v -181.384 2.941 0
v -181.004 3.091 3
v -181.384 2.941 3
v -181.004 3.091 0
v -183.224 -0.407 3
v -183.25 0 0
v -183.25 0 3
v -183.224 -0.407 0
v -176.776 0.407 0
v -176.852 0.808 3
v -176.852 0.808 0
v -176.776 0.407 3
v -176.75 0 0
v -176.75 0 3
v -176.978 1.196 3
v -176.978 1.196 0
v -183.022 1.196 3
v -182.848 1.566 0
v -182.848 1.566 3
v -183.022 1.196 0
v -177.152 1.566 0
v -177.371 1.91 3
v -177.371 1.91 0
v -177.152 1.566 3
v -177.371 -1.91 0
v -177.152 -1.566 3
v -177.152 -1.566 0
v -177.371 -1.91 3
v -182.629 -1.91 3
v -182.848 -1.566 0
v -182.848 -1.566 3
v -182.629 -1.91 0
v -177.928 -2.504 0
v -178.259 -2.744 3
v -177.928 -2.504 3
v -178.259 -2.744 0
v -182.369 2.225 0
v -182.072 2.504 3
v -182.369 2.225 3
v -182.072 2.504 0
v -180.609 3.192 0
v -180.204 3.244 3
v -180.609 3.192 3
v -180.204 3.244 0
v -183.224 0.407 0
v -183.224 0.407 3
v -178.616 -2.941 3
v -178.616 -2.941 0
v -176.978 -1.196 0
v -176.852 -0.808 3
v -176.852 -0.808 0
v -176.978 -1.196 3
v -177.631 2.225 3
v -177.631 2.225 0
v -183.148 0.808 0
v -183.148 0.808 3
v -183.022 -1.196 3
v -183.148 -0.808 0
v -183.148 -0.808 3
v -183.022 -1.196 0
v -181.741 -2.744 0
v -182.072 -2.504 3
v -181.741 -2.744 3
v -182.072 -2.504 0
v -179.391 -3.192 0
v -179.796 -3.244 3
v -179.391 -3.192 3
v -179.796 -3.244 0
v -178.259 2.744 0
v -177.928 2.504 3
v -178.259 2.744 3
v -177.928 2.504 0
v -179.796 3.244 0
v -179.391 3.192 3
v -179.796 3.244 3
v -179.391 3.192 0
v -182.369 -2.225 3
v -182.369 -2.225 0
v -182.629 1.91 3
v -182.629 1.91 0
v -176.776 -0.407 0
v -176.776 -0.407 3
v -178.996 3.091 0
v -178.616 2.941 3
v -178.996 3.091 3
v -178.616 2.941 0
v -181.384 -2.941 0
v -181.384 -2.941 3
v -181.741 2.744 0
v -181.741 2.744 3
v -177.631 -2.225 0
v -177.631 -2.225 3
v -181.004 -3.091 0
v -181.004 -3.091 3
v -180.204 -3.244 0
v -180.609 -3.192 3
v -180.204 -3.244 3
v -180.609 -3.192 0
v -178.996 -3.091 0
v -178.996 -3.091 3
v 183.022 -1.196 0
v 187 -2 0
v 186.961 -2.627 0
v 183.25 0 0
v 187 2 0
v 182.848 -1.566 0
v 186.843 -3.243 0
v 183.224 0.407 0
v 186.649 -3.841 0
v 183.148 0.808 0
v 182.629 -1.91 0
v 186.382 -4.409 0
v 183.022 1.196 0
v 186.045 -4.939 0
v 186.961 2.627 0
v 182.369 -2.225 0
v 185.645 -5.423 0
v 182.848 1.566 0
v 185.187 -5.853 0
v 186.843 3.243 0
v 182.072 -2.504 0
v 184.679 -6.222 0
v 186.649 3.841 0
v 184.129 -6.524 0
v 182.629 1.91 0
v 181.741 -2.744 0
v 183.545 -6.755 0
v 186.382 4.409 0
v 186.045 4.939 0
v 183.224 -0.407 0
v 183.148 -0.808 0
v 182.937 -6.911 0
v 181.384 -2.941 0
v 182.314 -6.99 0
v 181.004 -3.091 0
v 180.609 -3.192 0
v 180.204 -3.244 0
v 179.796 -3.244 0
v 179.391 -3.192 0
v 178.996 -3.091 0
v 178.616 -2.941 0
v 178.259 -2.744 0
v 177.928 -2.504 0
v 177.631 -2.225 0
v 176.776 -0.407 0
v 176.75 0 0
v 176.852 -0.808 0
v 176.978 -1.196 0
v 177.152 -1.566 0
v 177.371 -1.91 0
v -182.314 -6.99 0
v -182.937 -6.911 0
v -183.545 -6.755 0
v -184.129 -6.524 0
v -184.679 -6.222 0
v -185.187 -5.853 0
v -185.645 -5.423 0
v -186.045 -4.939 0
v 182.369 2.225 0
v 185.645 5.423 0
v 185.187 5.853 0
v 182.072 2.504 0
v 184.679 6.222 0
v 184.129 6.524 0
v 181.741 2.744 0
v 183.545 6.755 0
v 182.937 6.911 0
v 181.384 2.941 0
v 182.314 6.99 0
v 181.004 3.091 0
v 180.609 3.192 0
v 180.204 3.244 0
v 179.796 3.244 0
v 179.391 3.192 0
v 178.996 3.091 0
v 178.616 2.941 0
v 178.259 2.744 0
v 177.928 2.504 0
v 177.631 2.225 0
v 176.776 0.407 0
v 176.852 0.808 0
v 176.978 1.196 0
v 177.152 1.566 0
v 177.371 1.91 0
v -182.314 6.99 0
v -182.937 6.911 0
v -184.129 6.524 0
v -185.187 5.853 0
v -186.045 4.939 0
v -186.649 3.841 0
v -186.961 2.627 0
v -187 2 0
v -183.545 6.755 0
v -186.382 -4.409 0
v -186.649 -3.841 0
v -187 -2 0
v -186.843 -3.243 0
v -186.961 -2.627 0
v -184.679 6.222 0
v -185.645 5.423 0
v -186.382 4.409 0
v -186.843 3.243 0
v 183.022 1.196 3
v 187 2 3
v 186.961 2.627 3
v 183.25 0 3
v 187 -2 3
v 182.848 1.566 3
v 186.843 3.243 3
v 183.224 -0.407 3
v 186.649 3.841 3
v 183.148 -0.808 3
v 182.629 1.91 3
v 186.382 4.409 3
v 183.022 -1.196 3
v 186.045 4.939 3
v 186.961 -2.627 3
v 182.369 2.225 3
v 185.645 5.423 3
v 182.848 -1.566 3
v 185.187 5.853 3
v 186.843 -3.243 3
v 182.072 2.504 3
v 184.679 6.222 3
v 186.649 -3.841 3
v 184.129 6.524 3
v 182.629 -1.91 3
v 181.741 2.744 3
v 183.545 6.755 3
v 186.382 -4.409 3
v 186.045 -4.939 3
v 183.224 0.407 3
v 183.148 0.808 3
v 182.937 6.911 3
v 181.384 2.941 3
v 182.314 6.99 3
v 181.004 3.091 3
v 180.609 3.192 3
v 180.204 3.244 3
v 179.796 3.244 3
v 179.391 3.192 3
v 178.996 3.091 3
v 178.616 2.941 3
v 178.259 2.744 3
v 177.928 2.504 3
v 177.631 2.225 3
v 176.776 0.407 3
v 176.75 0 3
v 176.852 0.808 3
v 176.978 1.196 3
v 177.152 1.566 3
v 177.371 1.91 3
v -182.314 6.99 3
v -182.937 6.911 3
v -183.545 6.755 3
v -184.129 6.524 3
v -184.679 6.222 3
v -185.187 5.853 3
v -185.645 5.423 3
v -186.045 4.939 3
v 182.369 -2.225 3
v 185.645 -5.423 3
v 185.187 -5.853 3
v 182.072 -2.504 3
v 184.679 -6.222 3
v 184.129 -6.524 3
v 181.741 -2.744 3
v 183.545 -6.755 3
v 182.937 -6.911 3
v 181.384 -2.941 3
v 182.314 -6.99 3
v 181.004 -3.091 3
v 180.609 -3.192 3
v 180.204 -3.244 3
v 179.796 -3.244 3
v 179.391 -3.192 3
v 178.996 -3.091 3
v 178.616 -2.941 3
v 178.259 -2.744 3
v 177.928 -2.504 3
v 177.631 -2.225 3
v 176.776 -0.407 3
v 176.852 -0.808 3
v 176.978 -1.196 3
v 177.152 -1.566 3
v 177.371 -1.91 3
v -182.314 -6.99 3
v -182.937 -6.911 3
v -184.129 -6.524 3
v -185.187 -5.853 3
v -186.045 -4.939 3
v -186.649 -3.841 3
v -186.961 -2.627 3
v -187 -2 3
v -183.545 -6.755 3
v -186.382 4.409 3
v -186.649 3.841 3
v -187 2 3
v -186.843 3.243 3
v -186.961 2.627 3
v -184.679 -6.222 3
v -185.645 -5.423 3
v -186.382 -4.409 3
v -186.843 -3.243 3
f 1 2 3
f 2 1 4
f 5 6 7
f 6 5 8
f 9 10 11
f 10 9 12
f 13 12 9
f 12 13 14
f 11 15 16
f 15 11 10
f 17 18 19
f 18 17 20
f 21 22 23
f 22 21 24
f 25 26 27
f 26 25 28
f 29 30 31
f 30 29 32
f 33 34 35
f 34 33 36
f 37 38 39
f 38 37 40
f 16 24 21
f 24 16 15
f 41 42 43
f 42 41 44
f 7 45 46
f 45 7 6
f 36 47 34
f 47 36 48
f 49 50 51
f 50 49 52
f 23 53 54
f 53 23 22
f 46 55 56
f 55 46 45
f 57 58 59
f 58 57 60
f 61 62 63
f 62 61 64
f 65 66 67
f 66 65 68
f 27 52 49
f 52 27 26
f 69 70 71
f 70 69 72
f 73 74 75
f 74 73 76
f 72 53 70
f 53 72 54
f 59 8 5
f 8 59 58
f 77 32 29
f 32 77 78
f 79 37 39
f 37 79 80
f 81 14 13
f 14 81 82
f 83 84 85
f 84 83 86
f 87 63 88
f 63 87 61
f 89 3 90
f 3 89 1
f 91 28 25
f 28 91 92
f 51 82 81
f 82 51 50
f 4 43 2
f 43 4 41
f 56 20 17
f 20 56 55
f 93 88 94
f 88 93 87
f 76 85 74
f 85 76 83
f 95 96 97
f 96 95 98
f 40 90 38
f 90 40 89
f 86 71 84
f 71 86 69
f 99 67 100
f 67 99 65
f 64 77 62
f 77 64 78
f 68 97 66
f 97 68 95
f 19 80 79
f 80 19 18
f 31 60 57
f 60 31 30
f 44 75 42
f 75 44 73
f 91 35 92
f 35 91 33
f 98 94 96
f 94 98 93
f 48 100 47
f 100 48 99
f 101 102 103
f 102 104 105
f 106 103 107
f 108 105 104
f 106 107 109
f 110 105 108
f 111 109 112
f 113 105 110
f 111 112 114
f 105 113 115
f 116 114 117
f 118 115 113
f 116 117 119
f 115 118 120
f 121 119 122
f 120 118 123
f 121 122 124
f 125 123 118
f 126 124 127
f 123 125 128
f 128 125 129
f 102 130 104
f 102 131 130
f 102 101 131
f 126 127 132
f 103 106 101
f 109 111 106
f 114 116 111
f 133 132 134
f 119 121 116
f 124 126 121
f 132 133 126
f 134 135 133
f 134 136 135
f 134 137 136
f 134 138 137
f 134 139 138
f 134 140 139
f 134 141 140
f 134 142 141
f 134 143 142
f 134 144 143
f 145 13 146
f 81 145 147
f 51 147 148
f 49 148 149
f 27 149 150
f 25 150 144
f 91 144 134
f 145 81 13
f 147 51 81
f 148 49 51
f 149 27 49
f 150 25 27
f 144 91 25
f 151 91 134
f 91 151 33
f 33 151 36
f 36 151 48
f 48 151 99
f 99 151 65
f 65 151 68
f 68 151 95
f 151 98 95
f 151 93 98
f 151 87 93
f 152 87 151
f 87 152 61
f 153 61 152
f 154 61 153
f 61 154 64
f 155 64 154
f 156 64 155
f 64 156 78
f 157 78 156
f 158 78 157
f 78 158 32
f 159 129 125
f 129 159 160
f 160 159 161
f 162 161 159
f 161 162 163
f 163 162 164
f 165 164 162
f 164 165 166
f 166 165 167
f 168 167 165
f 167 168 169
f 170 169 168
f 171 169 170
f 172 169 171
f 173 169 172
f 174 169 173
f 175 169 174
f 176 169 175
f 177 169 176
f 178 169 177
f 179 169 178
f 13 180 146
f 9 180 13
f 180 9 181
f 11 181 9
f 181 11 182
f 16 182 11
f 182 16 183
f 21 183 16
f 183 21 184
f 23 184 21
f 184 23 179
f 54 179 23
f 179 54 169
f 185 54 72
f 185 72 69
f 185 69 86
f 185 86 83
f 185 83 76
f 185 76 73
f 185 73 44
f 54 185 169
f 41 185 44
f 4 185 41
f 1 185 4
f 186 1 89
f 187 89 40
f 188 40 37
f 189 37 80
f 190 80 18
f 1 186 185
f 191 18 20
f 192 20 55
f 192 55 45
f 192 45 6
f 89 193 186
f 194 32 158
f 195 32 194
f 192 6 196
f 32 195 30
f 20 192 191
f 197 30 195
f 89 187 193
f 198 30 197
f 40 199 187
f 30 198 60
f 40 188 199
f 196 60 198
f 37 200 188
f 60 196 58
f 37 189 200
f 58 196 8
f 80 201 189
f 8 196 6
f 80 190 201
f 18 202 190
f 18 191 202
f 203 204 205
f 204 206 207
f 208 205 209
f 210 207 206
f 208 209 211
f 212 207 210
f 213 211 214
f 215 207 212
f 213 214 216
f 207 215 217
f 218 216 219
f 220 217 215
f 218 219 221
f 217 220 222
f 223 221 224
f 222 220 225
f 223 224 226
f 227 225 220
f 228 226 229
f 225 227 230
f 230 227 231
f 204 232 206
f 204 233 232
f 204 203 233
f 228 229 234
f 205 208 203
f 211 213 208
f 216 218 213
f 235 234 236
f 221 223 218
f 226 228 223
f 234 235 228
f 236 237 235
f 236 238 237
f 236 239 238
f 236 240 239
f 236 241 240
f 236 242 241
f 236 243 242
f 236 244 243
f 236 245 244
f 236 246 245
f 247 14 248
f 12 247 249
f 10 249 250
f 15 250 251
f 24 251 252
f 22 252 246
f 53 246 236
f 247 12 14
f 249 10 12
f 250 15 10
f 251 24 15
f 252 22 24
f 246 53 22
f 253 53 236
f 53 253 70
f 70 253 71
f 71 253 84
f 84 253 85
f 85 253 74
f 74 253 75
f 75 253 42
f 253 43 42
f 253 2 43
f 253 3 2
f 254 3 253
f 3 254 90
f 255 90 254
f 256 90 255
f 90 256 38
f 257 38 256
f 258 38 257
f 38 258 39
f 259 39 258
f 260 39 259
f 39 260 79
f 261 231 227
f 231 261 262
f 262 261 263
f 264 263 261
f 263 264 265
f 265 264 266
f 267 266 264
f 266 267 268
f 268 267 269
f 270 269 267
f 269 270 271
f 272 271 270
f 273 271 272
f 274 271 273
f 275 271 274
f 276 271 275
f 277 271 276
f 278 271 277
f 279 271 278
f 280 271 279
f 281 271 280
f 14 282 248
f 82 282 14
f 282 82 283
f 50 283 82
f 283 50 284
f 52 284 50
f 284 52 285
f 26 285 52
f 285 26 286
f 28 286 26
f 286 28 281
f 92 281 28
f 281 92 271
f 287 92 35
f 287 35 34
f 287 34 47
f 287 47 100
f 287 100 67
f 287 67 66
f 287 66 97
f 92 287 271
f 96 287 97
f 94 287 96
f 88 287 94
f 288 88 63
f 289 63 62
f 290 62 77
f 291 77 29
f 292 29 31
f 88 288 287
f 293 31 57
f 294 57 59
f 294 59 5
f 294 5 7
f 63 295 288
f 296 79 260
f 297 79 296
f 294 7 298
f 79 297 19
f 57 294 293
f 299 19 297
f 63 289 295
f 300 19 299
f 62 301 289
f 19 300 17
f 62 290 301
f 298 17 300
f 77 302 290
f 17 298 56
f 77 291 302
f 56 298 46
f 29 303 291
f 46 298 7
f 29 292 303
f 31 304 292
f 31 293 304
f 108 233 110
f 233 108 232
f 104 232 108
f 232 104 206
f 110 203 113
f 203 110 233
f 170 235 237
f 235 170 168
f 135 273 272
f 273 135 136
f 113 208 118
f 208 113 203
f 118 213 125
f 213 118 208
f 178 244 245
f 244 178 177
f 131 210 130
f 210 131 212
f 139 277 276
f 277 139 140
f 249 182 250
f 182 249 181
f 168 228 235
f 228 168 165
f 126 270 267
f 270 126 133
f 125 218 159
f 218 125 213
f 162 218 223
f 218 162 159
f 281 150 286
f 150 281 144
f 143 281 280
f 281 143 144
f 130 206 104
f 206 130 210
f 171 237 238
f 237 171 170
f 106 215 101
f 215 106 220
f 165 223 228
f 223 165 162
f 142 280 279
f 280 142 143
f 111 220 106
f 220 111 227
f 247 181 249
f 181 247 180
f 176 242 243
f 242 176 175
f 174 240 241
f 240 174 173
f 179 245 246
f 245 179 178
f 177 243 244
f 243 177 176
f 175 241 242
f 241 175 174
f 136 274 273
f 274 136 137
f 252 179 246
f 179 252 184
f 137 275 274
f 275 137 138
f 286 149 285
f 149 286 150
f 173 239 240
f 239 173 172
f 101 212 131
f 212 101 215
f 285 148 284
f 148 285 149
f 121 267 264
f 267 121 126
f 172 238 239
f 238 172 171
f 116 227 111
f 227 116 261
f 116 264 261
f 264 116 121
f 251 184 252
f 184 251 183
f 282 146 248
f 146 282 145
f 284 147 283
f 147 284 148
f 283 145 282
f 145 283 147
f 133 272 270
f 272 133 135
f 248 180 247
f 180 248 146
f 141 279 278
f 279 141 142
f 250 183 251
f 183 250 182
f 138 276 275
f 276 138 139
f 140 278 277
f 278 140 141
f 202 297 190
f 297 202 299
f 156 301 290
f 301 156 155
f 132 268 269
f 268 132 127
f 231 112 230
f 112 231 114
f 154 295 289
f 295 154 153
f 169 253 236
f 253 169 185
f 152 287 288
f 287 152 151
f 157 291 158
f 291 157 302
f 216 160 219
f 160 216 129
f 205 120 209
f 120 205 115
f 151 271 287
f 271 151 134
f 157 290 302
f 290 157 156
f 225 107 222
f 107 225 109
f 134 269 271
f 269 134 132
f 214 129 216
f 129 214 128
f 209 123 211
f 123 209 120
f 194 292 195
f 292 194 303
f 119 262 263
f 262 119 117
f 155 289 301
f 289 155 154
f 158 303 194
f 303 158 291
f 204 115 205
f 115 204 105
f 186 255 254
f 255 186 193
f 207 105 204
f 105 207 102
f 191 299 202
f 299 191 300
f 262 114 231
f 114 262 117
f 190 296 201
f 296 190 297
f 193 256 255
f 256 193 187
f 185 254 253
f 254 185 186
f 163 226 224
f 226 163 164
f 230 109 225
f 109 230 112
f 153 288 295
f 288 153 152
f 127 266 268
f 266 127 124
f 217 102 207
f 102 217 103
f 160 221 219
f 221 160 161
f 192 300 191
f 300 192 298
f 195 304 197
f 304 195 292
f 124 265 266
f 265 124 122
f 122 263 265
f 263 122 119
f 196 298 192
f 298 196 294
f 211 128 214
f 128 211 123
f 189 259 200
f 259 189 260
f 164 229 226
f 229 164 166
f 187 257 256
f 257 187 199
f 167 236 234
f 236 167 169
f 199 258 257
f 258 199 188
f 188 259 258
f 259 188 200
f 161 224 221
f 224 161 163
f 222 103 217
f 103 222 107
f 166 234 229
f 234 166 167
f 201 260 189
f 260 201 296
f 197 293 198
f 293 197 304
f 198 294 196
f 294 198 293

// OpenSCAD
$fn = 50;


difference() {
	union() {
		hull() {
			translate(v = [-182.0000000000, 2.0000000000, 0]) {
				cylinder(h = 3, r = 5);
			}
			translate(v = [182.0000000000, 2.0000000000, 0]) {
				cylinder(h = 3, r = 5);
			}
			translate(v = [-182.0000000000, -2.0000000000, 0]) {
				cylinder(h = 3, r = 5);
			}
			translate(v = [182.0000000000, -2.0000000000, 0]) {
				cylinder(h = 3, r = 5);
			}
		}
	}
	union() {
		translate(v = [-180.0000000000, 0.0000000000, 0]) {
			cylinder(h = 3, r = 3.2500000000);
		}
		translate(v = [180.0000000000, 0.0000000000, 0]) {
			cylinder(h = 3, r = 3.2500000000);
		}
		translate(v = [-180.0000000000, 0.0000000000, 0]) {
			cylinder(h = 3, r = 1.8000000000);
		}
		translate(v = [180.0000000000, 0.0000000000, 0]) {
			cylinder(h = 3, r = 1.8000000000);
		}
		translate(v = [-180.0000000000, 0.0000000000, 0]) {
			cylinder(h = 3, r = 1.8000000000);
		}
		translate(v = [180.0000000000, 0.0000000000, 0]) {
			cylinder(h = 3, r = 1.8000000000);
		}
		translate(v = [-180.0000000000, 0.0000000000, 0]) {
			cylinder(h = 3, r = 1.8000000000);
		}
		translate(v = [180.0000000000, 0.0000000000, 0]) {
			cylinder(h = 3, r = 1.8000000000);
		}
	}
}
